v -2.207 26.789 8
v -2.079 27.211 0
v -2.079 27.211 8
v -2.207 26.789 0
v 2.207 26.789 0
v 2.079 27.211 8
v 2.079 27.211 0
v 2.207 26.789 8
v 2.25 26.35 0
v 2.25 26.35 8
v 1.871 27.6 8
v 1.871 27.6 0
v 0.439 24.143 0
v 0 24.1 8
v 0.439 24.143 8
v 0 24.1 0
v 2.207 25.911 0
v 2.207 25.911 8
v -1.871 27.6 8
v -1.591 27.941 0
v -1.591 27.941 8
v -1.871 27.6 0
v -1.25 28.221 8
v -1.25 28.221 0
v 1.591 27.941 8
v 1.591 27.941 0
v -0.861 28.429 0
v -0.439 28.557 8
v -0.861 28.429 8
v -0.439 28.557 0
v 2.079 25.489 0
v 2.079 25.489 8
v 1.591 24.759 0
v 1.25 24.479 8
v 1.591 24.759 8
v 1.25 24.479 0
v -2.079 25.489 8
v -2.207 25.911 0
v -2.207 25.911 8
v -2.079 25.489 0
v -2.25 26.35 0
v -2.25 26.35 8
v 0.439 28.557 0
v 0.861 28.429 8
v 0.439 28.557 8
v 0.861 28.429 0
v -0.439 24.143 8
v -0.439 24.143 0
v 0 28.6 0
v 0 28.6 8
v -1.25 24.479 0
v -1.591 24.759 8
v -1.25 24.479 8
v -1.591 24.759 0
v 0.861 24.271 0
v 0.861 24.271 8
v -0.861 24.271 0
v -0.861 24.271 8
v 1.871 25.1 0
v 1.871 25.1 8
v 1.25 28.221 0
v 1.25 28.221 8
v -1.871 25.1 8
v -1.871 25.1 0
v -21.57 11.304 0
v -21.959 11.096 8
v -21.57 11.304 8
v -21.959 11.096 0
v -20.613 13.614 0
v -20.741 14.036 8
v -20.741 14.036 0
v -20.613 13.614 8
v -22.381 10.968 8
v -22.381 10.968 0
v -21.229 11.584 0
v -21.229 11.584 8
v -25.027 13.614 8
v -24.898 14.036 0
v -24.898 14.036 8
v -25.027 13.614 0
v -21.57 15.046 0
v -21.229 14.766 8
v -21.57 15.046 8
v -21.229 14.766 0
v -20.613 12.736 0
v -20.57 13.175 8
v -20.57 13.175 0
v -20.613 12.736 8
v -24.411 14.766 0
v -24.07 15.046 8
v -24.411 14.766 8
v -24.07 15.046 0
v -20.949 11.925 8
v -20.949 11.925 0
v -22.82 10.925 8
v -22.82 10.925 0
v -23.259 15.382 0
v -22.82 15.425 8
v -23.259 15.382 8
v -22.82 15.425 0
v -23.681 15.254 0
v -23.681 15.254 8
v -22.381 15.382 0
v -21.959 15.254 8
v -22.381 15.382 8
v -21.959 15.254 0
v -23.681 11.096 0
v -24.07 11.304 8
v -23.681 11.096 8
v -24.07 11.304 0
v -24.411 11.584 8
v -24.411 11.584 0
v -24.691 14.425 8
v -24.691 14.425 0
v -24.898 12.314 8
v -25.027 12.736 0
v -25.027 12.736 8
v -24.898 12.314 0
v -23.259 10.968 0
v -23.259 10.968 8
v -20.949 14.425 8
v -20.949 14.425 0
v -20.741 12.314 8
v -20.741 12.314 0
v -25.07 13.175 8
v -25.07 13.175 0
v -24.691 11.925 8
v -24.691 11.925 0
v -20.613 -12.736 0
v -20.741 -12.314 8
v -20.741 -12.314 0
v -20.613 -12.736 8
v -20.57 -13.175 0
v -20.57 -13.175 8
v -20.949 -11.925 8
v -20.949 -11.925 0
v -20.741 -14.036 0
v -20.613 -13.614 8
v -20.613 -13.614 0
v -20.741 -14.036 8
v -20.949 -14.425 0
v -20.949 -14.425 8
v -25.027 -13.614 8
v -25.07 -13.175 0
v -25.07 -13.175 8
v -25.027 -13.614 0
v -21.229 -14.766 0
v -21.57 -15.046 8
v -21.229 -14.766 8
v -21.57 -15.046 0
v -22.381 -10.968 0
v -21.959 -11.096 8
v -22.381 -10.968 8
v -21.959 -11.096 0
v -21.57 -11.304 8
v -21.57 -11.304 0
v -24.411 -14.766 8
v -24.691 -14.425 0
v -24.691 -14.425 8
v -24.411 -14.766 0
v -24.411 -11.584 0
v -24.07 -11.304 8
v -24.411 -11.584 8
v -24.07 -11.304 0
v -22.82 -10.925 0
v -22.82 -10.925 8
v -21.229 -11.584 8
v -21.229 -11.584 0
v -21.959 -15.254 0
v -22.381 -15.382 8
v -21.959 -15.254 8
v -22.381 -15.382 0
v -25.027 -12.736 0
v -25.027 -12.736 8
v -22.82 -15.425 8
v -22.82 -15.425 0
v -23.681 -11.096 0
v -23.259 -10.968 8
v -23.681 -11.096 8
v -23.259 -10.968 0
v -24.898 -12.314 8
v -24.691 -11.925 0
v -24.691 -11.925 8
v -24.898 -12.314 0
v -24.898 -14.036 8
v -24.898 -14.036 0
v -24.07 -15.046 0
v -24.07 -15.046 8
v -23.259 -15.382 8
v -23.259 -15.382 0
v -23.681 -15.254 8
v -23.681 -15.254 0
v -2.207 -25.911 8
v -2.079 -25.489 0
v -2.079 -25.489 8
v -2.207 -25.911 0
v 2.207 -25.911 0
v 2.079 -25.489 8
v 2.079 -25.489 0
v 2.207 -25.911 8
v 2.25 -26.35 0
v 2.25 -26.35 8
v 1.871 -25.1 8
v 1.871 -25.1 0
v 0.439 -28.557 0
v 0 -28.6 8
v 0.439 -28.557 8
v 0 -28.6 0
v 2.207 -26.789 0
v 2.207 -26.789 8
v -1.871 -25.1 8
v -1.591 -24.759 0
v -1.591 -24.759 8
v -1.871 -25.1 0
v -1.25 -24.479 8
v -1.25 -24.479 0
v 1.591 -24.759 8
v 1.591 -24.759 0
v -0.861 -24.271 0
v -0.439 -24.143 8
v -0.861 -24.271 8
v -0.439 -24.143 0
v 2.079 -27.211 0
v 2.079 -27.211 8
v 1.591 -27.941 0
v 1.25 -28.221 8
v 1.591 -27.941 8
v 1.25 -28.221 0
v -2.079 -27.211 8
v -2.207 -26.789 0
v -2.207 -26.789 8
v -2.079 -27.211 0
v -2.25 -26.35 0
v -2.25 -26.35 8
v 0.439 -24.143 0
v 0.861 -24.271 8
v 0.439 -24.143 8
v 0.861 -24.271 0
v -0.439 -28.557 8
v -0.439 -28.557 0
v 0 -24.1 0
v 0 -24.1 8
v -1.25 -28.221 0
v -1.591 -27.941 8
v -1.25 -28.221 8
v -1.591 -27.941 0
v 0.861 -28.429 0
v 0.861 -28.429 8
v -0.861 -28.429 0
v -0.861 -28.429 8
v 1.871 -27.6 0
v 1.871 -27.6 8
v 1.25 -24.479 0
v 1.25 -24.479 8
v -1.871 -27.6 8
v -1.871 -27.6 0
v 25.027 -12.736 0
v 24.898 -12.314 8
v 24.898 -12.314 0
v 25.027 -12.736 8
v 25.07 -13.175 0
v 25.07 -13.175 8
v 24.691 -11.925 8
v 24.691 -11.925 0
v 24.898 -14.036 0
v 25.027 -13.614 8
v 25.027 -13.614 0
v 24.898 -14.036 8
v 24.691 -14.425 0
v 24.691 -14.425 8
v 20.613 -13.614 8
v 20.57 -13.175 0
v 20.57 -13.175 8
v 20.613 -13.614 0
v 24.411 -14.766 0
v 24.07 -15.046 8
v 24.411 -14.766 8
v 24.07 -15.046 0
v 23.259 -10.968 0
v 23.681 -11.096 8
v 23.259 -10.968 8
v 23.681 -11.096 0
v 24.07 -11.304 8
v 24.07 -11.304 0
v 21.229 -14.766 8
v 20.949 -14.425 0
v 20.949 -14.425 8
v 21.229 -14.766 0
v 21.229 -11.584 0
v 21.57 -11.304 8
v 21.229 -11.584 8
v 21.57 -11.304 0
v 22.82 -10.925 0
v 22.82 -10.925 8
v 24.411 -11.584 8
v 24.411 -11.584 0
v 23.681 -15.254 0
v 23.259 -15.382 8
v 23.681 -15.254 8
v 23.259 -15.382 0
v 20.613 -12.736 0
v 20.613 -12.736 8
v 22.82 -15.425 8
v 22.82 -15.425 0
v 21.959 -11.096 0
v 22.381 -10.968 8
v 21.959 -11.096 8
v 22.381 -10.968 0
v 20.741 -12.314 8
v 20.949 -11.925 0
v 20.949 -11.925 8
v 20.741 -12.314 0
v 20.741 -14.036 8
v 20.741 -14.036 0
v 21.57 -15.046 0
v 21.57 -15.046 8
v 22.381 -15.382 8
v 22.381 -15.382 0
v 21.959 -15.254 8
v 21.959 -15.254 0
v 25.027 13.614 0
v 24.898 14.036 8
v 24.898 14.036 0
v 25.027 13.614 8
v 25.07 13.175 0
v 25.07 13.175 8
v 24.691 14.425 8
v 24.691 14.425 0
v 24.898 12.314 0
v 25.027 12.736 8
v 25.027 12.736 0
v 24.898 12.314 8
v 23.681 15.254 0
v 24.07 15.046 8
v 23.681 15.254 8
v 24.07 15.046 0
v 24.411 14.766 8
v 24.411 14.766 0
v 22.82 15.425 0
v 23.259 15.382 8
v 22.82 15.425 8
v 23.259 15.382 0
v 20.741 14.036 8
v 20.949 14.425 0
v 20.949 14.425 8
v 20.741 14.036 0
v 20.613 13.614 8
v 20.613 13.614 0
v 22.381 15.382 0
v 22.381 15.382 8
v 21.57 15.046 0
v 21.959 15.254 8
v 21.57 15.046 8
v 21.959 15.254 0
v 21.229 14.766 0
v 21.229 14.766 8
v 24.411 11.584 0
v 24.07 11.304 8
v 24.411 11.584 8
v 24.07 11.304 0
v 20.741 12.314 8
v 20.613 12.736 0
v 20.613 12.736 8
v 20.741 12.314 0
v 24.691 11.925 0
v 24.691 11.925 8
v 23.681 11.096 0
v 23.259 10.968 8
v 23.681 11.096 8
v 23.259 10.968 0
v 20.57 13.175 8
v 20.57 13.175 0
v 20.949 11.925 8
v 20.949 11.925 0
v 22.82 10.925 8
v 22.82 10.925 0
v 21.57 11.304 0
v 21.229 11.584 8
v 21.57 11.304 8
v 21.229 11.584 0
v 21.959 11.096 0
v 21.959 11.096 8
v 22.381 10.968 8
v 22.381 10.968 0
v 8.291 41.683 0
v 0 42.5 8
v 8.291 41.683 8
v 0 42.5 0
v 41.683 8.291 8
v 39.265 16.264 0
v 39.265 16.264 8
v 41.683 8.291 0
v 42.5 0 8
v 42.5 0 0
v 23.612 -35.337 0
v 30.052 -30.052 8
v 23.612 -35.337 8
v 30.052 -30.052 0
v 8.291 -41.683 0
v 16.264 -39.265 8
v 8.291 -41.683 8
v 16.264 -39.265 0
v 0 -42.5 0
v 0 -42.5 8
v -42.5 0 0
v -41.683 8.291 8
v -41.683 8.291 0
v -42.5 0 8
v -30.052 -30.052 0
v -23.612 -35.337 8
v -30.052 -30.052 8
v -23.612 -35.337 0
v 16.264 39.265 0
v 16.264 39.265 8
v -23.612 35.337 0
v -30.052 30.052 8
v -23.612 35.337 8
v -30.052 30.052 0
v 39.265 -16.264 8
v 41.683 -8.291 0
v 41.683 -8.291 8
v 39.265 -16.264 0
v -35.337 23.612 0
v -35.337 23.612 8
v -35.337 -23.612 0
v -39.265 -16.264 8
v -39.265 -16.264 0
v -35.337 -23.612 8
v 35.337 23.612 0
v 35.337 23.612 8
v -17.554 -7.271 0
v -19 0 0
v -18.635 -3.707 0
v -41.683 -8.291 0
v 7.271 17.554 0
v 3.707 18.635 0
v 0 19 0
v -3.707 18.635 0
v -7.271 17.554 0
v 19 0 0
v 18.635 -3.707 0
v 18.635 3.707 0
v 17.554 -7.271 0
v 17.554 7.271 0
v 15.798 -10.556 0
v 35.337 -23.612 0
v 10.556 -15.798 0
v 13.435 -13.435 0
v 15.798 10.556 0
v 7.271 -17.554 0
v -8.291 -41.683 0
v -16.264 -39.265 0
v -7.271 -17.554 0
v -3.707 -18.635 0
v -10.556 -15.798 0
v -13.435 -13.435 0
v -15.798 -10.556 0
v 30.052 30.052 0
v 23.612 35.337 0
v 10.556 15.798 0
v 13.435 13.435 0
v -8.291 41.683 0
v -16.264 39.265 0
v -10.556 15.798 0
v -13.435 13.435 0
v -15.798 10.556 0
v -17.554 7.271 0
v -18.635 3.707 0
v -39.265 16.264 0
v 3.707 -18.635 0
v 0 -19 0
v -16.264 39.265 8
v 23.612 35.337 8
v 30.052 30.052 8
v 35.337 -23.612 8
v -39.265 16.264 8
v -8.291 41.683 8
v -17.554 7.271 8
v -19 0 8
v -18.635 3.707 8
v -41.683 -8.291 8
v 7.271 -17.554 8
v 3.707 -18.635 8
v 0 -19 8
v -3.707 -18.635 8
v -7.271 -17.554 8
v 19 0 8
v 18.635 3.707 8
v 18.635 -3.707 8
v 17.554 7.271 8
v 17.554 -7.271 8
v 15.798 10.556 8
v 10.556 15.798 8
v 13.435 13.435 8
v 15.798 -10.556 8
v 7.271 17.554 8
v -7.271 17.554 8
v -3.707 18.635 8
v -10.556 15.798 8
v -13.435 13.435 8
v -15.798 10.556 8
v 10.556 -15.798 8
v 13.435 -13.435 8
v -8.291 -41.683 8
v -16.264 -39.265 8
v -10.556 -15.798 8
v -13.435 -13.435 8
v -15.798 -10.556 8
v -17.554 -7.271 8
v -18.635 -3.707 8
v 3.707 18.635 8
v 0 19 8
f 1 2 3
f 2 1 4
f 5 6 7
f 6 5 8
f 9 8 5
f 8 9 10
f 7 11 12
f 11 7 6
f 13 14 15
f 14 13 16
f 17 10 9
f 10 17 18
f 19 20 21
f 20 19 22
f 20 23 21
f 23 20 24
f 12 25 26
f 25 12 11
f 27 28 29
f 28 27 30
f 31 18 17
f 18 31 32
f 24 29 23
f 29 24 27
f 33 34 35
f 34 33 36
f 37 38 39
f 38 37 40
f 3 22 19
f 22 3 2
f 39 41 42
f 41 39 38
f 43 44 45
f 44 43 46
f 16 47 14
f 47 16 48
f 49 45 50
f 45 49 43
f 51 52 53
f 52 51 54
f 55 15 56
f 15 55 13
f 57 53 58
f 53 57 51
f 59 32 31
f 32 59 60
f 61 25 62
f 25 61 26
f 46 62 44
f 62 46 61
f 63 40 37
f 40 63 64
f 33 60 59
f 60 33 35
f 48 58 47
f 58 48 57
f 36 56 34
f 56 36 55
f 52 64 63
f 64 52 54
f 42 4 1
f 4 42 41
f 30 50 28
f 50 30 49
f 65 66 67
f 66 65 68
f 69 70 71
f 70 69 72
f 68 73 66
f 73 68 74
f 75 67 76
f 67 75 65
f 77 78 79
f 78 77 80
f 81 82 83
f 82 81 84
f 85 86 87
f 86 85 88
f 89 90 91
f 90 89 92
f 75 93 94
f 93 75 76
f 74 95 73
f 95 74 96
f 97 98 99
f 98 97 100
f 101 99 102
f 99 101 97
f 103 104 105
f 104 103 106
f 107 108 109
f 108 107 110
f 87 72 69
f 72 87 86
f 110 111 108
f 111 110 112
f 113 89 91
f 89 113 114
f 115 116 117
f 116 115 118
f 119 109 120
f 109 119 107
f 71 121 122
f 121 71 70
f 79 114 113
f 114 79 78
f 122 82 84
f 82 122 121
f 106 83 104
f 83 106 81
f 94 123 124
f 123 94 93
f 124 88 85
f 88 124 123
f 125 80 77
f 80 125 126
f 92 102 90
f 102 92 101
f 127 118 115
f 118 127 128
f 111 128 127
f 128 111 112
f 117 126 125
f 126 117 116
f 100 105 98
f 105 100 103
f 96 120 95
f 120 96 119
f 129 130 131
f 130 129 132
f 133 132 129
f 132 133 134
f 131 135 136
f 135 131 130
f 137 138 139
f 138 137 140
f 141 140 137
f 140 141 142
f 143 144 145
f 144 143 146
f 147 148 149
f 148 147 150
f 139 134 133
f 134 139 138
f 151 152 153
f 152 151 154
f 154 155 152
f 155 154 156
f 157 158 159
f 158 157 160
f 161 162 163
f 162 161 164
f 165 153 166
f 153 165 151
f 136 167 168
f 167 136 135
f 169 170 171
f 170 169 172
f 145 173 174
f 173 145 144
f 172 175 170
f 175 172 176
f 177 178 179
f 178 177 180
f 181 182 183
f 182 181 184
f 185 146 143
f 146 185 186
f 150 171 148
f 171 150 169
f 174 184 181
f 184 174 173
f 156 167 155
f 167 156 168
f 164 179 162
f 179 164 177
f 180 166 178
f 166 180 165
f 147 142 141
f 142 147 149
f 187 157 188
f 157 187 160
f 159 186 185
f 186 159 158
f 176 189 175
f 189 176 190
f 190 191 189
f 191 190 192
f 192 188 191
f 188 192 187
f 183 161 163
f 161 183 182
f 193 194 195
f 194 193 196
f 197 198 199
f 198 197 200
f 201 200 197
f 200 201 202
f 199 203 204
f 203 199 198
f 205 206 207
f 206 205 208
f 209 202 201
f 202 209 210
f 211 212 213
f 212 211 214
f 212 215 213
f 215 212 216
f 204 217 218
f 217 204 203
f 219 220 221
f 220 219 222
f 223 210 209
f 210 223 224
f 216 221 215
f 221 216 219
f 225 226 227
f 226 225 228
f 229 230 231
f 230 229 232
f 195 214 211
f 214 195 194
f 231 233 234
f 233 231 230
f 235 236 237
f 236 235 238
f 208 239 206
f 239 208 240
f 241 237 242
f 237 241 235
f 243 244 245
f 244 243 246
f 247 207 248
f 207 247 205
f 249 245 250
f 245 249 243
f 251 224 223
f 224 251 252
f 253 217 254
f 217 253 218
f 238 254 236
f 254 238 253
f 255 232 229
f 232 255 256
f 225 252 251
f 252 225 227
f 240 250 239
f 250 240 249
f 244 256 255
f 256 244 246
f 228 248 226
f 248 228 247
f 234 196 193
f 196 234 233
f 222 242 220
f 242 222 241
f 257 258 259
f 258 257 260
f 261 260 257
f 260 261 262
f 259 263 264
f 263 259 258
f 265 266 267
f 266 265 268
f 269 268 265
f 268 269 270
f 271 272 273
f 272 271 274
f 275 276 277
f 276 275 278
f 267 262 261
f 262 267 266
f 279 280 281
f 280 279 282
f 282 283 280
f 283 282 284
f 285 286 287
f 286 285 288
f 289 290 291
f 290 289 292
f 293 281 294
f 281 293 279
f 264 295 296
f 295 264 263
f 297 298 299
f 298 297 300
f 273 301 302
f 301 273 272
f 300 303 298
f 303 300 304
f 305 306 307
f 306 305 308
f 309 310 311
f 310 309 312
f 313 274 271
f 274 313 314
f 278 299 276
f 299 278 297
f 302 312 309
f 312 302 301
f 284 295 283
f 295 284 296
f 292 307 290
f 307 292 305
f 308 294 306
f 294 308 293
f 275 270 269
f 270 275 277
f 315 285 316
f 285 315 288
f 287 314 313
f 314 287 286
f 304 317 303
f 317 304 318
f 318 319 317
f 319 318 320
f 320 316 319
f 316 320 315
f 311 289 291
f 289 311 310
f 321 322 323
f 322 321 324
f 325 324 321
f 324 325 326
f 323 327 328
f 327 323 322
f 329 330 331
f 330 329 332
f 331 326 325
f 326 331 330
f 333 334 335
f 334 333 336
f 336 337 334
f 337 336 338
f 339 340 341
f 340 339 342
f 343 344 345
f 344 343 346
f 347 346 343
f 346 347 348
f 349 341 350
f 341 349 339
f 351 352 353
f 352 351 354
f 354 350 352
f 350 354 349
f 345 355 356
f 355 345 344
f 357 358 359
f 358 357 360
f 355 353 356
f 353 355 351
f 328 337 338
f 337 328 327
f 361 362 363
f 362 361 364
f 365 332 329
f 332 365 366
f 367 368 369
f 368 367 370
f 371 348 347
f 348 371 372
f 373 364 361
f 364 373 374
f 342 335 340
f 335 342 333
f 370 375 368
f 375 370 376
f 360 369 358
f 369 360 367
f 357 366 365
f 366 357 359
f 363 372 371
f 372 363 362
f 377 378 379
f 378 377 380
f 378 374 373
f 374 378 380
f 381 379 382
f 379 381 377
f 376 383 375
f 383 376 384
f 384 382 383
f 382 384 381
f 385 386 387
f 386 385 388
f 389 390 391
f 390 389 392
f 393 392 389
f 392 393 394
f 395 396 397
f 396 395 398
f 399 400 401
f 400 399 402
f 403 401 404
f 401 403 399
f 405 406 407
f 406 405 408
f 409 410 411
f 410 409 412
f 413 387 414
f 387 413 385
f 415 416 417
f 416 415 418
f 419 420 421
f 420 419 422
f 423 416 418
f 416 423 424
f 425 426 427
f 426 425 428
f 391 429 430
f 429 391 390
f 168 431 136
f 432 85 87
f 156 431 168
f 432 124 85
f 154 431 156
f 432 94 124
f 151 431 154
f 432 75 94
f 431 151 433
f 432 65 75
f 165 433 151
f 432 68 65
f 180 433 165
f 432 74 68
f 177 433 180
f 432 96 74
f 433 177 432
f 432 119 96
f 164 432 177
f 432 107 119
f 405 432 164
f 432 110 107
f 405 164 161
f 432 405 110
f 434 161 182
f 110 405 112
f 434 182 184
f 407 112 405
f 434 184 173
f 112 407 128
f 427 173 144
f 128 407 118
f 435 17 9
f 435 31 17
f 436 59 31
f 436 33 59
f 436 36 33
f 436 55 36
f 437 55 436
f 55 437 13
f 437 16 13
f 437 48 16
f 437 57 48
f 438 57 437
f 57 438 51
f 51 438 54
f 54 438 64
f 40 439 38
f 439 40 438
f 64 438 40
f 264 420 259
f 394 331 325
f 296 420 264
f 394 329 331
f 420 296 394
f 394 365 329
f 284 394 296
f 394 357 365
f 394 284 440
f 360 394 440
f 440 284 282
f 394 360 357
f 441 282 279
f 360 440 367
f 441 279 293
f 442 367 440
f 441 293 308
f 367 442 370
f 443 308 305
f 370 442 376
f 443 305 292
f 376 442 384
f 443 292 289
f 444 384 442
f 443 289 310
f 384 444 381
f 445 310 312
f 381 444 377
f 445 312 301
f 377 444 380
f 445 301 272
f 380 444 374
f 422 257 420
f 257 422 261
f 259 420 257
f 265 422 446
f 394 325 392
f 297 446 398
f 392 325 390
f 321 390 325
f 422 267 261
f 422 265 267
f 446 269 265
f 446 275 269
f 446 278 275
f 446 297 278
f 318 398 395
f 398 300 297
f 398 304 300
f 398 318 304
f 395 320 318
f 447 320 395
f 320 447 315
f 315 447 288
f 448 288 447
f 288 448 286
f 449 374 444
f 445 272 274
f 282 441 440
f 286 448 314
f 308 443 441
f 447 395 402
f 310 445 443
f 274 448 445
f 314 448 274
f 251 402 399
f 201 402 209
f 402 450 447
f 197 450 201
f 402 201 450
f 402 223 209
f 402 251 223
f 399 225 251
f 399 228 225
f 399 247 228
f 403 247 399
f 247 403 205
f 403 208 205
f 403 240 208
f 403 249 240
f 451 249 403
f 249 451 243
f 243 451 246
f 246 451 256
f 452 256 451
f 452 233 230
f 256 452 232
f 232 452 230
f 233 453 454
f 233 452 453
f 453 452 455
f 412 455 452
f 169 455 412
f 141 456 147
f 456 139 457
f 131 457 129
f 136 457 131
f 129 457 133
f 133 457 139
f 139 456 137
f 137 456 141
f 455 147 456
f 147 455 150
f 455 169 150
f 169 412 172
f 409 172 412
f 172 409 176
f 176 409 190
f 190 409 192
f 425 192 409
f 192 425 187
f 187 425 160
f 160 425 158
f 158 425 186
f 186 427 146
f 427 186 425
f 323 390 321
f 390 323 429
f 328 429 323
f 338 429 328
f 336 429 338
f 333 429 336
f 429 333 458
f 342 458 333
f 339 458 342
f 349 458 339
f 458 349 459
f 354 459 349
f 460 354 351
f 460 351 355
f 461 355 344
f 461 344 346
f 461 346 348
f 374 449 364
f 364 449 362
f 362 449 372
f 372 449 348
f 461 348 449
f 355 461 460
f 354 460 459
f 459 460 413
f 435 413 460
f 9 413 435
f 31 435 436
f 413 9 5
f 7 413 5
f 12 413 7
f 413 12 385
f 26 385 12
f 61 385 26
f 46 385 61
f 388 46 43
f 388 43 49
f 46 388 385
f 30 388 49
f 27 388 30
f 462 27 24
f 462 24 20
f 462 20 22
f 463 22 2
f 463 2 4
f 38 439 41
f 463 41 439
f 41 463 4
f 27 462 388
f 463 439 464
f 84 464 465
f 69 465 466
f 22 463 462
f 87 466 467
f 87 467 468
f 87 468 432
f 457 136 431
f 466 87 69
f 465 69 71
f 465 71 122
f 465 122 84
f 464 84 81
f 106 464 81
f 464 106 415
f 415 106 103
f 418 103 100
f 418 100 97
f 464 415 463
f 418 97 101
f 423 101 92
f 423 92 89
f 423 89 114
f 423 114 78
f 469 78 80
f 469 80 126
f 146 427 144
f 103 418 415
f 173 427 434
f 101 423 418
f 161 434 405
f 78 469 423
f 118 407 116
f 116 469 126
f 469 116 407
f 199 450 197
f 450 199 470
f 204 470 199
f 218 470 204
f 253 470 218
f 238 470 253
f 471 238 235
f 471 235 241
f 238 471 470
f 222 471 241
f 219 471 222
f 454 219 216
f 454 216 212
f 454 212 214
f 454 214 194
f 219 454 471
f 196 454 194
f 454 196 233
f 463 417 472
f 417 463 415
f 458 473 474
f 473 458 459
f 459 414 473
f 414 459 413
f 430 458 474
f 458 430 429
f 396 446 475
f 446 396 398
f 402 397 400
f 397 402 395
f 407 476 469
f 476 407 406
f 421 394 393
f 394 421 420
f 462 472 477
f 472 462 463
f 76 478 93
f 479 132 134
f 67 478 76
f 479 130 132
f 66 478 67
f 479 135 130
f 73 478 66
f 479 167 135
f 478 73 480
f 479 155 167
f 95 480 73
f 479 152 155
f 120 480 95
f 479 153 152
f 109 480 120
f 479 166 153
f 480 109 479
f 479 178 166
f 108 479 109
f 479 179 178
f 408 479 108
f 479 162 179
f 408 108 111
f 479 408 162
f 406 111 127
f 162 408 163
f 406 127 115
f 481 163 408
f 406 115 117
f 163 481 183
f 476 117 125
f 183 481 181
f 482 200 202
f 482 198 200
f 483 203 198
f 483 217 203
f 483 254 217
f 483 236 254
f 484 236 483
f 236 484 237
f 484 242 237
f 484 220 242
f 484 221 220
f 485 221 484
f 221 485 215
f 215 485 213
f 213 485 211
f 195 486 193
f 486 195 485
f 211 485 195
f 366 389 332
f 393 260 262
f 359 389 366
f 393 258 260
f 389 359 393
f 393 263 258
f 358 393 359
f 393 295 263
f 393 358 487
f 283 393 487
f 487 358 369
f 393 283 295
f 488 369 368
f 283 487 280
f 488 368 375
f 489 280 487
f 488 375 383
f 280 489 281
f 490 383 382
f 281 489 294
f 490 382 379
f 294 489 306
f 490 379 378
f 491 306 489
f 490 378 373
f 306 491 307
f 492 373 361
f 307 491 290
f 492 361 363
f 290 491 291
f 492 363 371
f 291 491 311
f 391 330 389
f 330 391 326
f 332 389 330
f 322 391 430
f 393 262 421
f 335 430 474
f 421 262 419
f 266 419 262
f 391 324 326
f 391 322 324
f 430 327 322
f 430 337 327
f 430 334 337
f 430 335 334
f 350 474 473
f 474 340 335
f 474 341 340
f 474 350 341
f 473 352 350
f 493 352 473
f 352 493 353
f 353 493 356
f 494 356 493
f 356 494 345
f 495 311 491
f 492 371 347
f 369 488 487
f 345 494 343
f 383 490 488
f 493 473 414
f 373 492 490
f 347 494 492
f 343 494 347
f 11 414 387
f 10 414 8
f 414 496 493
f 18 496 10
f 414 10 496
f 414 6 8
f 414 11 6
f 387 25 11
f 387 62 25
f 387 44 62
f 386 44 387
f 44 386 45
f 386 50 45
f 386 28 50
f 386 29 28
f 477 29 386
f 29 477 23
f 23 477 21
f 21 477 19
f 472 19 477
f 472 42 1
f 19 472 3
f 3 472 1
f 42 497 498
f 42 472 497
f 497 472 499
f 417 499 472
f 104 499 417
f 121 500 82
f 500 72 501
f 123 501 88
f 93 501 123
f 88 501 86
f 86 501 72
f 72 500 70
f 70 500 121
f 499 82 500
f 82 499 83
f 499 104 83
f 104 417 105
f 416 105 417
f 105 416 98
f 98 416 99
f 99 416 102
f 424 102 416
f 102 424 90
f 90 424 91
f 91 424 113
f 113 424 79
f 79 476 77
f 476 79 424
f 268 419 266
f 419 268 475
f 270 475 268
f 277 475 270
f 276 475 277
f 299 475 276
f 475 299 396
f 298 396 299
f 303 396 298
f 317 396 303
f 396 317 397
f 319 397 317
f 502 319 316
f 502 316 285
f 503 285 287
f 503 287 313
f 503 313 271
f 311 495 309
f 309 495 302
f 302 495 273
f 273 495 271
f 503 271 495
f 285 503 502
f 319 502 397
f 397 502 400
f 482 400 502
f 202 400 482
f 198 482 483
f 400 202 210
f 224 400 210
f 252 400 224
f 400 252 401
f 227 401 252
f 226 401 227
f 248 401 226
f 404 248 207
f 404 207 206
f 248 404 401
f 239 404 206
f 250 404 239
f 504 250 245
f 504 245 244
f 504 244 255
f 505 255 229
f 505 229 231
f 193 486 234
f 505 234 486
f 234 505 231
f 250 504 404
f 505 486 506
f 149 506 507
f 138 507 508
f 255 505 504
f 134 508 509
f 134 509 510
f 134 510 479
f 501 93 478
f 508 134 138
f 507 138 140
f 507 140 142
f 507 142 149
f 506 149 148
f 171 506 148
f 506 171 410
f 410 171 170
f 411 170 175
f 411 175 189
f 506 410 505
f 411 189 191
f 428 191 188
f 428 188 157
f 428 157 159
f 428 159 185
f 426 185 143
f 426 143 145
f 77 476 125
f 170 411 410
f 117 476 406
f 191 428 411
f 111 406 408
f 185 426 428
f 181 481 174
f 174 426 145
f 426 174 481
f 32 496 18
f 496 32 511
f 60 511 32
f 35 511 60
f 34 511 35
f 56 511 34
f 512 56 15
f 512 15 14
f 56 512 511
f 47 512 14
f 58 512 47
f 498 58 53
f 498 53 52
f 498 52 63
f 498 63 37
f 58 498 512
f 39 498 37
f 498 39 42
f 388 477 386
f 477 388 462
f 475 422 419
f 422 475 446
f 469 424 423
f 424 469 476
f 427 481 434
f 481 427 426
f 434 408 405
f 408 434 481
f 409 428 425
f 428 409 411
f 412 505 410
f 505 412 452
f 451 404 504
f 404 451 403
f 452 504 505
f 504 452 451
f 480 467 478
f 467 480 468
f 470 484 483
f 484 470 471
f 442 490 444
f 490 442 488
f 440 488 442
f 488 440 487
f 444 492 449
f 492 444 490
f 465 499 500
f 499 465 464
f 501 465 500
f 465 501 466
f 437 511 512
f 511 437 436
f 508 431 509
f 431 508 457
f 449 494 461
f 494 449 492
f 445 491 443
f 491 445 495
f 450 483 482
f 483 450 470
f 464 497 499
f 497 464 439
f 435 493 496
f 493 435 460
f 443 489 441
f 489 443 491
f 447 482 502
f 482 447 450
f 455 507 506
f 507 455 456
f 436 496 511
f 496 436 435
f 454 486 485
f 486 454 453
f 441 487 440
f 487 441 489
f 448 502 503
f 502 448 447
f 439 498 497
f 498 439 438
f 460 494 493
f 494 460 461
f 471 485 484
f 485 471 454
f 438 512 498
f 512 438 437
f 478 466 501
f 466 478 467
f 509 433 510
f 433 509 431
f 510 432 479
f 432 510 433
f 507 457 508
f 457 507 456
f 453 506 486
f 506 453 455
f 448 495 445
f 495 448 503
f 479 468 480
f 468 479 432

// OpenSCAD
$fn = 32;

// ----------------------------------------------------------------------
// Flange Ø85 x 8
// 6 holes on a Ø52.7 bolt circle, bolted joints
// ----------------------------------------------------------------------

// --- parameters (mm) ---
flange_d = 85;   // outside diameter of the flange
thickness = 8;   // flange thickness
holes = 6;       // number of bolt holes
pcd = 52.7;      // bolt circle diameter
start_deg = 90;  // angle of the first hole, from +X
hole_d = 4.5;    // bolt hole diameter
bore_d = 38;     // central through bore
hub_d = 46;      // hub outside diameter
hub_h = 0;       // hub height above the flange face (0 = no hub)

// --- derived feature positions (mm) ---
height = thickness + hub_h;  // = 8   overall height of the part
pcd_r = pcd / 2;             // = 26.35   bolt circle radius
hole_step = 360 / holes;     // = 60   angular pitch
feature_centers = [
  [pcd_r * cos(start_deg + 0 * hole_step), pcd_r * sin(start_deg + 0 * hole_step)],
  [pcd_r * cos(start_deg + 1 * hole_step), pcd_r * sin(start_deg + 1 * hole_step)],
  [pcd_r * cos(start_deg + 2 * hole_step), pcd_r * sin(start_deg + 2 * hole_step)],
  [pcd_r * cos(start_deg + 3 * hole_step), pcd_r * sin(start_deg + 3 * hole_step)],
  [pcd_r * cos(start_deg + 4 * hole_step), pcd_r * sin(start_deg + 4 * hole_step)],
  [pcd_r * cos(start_deg + 5 * hole_step), pcd_r * sin(start_deg + 5 * hole_step)]
];   // bolt hole centres on the pitch circle

// flange disc, every hole and the bore cut straight through
difference() {
  union() {
    cylinder(d = flange_d, h = thickness);
  }
  translate([0, 0, -1]) cylinder(d = bore_d, h = height + 2);  // bore, through
  for (centre = feature_centers)
    translate([centre[0], centre[1], -1]) cylinder(d = hole_d, h = thickness + 2);
}
